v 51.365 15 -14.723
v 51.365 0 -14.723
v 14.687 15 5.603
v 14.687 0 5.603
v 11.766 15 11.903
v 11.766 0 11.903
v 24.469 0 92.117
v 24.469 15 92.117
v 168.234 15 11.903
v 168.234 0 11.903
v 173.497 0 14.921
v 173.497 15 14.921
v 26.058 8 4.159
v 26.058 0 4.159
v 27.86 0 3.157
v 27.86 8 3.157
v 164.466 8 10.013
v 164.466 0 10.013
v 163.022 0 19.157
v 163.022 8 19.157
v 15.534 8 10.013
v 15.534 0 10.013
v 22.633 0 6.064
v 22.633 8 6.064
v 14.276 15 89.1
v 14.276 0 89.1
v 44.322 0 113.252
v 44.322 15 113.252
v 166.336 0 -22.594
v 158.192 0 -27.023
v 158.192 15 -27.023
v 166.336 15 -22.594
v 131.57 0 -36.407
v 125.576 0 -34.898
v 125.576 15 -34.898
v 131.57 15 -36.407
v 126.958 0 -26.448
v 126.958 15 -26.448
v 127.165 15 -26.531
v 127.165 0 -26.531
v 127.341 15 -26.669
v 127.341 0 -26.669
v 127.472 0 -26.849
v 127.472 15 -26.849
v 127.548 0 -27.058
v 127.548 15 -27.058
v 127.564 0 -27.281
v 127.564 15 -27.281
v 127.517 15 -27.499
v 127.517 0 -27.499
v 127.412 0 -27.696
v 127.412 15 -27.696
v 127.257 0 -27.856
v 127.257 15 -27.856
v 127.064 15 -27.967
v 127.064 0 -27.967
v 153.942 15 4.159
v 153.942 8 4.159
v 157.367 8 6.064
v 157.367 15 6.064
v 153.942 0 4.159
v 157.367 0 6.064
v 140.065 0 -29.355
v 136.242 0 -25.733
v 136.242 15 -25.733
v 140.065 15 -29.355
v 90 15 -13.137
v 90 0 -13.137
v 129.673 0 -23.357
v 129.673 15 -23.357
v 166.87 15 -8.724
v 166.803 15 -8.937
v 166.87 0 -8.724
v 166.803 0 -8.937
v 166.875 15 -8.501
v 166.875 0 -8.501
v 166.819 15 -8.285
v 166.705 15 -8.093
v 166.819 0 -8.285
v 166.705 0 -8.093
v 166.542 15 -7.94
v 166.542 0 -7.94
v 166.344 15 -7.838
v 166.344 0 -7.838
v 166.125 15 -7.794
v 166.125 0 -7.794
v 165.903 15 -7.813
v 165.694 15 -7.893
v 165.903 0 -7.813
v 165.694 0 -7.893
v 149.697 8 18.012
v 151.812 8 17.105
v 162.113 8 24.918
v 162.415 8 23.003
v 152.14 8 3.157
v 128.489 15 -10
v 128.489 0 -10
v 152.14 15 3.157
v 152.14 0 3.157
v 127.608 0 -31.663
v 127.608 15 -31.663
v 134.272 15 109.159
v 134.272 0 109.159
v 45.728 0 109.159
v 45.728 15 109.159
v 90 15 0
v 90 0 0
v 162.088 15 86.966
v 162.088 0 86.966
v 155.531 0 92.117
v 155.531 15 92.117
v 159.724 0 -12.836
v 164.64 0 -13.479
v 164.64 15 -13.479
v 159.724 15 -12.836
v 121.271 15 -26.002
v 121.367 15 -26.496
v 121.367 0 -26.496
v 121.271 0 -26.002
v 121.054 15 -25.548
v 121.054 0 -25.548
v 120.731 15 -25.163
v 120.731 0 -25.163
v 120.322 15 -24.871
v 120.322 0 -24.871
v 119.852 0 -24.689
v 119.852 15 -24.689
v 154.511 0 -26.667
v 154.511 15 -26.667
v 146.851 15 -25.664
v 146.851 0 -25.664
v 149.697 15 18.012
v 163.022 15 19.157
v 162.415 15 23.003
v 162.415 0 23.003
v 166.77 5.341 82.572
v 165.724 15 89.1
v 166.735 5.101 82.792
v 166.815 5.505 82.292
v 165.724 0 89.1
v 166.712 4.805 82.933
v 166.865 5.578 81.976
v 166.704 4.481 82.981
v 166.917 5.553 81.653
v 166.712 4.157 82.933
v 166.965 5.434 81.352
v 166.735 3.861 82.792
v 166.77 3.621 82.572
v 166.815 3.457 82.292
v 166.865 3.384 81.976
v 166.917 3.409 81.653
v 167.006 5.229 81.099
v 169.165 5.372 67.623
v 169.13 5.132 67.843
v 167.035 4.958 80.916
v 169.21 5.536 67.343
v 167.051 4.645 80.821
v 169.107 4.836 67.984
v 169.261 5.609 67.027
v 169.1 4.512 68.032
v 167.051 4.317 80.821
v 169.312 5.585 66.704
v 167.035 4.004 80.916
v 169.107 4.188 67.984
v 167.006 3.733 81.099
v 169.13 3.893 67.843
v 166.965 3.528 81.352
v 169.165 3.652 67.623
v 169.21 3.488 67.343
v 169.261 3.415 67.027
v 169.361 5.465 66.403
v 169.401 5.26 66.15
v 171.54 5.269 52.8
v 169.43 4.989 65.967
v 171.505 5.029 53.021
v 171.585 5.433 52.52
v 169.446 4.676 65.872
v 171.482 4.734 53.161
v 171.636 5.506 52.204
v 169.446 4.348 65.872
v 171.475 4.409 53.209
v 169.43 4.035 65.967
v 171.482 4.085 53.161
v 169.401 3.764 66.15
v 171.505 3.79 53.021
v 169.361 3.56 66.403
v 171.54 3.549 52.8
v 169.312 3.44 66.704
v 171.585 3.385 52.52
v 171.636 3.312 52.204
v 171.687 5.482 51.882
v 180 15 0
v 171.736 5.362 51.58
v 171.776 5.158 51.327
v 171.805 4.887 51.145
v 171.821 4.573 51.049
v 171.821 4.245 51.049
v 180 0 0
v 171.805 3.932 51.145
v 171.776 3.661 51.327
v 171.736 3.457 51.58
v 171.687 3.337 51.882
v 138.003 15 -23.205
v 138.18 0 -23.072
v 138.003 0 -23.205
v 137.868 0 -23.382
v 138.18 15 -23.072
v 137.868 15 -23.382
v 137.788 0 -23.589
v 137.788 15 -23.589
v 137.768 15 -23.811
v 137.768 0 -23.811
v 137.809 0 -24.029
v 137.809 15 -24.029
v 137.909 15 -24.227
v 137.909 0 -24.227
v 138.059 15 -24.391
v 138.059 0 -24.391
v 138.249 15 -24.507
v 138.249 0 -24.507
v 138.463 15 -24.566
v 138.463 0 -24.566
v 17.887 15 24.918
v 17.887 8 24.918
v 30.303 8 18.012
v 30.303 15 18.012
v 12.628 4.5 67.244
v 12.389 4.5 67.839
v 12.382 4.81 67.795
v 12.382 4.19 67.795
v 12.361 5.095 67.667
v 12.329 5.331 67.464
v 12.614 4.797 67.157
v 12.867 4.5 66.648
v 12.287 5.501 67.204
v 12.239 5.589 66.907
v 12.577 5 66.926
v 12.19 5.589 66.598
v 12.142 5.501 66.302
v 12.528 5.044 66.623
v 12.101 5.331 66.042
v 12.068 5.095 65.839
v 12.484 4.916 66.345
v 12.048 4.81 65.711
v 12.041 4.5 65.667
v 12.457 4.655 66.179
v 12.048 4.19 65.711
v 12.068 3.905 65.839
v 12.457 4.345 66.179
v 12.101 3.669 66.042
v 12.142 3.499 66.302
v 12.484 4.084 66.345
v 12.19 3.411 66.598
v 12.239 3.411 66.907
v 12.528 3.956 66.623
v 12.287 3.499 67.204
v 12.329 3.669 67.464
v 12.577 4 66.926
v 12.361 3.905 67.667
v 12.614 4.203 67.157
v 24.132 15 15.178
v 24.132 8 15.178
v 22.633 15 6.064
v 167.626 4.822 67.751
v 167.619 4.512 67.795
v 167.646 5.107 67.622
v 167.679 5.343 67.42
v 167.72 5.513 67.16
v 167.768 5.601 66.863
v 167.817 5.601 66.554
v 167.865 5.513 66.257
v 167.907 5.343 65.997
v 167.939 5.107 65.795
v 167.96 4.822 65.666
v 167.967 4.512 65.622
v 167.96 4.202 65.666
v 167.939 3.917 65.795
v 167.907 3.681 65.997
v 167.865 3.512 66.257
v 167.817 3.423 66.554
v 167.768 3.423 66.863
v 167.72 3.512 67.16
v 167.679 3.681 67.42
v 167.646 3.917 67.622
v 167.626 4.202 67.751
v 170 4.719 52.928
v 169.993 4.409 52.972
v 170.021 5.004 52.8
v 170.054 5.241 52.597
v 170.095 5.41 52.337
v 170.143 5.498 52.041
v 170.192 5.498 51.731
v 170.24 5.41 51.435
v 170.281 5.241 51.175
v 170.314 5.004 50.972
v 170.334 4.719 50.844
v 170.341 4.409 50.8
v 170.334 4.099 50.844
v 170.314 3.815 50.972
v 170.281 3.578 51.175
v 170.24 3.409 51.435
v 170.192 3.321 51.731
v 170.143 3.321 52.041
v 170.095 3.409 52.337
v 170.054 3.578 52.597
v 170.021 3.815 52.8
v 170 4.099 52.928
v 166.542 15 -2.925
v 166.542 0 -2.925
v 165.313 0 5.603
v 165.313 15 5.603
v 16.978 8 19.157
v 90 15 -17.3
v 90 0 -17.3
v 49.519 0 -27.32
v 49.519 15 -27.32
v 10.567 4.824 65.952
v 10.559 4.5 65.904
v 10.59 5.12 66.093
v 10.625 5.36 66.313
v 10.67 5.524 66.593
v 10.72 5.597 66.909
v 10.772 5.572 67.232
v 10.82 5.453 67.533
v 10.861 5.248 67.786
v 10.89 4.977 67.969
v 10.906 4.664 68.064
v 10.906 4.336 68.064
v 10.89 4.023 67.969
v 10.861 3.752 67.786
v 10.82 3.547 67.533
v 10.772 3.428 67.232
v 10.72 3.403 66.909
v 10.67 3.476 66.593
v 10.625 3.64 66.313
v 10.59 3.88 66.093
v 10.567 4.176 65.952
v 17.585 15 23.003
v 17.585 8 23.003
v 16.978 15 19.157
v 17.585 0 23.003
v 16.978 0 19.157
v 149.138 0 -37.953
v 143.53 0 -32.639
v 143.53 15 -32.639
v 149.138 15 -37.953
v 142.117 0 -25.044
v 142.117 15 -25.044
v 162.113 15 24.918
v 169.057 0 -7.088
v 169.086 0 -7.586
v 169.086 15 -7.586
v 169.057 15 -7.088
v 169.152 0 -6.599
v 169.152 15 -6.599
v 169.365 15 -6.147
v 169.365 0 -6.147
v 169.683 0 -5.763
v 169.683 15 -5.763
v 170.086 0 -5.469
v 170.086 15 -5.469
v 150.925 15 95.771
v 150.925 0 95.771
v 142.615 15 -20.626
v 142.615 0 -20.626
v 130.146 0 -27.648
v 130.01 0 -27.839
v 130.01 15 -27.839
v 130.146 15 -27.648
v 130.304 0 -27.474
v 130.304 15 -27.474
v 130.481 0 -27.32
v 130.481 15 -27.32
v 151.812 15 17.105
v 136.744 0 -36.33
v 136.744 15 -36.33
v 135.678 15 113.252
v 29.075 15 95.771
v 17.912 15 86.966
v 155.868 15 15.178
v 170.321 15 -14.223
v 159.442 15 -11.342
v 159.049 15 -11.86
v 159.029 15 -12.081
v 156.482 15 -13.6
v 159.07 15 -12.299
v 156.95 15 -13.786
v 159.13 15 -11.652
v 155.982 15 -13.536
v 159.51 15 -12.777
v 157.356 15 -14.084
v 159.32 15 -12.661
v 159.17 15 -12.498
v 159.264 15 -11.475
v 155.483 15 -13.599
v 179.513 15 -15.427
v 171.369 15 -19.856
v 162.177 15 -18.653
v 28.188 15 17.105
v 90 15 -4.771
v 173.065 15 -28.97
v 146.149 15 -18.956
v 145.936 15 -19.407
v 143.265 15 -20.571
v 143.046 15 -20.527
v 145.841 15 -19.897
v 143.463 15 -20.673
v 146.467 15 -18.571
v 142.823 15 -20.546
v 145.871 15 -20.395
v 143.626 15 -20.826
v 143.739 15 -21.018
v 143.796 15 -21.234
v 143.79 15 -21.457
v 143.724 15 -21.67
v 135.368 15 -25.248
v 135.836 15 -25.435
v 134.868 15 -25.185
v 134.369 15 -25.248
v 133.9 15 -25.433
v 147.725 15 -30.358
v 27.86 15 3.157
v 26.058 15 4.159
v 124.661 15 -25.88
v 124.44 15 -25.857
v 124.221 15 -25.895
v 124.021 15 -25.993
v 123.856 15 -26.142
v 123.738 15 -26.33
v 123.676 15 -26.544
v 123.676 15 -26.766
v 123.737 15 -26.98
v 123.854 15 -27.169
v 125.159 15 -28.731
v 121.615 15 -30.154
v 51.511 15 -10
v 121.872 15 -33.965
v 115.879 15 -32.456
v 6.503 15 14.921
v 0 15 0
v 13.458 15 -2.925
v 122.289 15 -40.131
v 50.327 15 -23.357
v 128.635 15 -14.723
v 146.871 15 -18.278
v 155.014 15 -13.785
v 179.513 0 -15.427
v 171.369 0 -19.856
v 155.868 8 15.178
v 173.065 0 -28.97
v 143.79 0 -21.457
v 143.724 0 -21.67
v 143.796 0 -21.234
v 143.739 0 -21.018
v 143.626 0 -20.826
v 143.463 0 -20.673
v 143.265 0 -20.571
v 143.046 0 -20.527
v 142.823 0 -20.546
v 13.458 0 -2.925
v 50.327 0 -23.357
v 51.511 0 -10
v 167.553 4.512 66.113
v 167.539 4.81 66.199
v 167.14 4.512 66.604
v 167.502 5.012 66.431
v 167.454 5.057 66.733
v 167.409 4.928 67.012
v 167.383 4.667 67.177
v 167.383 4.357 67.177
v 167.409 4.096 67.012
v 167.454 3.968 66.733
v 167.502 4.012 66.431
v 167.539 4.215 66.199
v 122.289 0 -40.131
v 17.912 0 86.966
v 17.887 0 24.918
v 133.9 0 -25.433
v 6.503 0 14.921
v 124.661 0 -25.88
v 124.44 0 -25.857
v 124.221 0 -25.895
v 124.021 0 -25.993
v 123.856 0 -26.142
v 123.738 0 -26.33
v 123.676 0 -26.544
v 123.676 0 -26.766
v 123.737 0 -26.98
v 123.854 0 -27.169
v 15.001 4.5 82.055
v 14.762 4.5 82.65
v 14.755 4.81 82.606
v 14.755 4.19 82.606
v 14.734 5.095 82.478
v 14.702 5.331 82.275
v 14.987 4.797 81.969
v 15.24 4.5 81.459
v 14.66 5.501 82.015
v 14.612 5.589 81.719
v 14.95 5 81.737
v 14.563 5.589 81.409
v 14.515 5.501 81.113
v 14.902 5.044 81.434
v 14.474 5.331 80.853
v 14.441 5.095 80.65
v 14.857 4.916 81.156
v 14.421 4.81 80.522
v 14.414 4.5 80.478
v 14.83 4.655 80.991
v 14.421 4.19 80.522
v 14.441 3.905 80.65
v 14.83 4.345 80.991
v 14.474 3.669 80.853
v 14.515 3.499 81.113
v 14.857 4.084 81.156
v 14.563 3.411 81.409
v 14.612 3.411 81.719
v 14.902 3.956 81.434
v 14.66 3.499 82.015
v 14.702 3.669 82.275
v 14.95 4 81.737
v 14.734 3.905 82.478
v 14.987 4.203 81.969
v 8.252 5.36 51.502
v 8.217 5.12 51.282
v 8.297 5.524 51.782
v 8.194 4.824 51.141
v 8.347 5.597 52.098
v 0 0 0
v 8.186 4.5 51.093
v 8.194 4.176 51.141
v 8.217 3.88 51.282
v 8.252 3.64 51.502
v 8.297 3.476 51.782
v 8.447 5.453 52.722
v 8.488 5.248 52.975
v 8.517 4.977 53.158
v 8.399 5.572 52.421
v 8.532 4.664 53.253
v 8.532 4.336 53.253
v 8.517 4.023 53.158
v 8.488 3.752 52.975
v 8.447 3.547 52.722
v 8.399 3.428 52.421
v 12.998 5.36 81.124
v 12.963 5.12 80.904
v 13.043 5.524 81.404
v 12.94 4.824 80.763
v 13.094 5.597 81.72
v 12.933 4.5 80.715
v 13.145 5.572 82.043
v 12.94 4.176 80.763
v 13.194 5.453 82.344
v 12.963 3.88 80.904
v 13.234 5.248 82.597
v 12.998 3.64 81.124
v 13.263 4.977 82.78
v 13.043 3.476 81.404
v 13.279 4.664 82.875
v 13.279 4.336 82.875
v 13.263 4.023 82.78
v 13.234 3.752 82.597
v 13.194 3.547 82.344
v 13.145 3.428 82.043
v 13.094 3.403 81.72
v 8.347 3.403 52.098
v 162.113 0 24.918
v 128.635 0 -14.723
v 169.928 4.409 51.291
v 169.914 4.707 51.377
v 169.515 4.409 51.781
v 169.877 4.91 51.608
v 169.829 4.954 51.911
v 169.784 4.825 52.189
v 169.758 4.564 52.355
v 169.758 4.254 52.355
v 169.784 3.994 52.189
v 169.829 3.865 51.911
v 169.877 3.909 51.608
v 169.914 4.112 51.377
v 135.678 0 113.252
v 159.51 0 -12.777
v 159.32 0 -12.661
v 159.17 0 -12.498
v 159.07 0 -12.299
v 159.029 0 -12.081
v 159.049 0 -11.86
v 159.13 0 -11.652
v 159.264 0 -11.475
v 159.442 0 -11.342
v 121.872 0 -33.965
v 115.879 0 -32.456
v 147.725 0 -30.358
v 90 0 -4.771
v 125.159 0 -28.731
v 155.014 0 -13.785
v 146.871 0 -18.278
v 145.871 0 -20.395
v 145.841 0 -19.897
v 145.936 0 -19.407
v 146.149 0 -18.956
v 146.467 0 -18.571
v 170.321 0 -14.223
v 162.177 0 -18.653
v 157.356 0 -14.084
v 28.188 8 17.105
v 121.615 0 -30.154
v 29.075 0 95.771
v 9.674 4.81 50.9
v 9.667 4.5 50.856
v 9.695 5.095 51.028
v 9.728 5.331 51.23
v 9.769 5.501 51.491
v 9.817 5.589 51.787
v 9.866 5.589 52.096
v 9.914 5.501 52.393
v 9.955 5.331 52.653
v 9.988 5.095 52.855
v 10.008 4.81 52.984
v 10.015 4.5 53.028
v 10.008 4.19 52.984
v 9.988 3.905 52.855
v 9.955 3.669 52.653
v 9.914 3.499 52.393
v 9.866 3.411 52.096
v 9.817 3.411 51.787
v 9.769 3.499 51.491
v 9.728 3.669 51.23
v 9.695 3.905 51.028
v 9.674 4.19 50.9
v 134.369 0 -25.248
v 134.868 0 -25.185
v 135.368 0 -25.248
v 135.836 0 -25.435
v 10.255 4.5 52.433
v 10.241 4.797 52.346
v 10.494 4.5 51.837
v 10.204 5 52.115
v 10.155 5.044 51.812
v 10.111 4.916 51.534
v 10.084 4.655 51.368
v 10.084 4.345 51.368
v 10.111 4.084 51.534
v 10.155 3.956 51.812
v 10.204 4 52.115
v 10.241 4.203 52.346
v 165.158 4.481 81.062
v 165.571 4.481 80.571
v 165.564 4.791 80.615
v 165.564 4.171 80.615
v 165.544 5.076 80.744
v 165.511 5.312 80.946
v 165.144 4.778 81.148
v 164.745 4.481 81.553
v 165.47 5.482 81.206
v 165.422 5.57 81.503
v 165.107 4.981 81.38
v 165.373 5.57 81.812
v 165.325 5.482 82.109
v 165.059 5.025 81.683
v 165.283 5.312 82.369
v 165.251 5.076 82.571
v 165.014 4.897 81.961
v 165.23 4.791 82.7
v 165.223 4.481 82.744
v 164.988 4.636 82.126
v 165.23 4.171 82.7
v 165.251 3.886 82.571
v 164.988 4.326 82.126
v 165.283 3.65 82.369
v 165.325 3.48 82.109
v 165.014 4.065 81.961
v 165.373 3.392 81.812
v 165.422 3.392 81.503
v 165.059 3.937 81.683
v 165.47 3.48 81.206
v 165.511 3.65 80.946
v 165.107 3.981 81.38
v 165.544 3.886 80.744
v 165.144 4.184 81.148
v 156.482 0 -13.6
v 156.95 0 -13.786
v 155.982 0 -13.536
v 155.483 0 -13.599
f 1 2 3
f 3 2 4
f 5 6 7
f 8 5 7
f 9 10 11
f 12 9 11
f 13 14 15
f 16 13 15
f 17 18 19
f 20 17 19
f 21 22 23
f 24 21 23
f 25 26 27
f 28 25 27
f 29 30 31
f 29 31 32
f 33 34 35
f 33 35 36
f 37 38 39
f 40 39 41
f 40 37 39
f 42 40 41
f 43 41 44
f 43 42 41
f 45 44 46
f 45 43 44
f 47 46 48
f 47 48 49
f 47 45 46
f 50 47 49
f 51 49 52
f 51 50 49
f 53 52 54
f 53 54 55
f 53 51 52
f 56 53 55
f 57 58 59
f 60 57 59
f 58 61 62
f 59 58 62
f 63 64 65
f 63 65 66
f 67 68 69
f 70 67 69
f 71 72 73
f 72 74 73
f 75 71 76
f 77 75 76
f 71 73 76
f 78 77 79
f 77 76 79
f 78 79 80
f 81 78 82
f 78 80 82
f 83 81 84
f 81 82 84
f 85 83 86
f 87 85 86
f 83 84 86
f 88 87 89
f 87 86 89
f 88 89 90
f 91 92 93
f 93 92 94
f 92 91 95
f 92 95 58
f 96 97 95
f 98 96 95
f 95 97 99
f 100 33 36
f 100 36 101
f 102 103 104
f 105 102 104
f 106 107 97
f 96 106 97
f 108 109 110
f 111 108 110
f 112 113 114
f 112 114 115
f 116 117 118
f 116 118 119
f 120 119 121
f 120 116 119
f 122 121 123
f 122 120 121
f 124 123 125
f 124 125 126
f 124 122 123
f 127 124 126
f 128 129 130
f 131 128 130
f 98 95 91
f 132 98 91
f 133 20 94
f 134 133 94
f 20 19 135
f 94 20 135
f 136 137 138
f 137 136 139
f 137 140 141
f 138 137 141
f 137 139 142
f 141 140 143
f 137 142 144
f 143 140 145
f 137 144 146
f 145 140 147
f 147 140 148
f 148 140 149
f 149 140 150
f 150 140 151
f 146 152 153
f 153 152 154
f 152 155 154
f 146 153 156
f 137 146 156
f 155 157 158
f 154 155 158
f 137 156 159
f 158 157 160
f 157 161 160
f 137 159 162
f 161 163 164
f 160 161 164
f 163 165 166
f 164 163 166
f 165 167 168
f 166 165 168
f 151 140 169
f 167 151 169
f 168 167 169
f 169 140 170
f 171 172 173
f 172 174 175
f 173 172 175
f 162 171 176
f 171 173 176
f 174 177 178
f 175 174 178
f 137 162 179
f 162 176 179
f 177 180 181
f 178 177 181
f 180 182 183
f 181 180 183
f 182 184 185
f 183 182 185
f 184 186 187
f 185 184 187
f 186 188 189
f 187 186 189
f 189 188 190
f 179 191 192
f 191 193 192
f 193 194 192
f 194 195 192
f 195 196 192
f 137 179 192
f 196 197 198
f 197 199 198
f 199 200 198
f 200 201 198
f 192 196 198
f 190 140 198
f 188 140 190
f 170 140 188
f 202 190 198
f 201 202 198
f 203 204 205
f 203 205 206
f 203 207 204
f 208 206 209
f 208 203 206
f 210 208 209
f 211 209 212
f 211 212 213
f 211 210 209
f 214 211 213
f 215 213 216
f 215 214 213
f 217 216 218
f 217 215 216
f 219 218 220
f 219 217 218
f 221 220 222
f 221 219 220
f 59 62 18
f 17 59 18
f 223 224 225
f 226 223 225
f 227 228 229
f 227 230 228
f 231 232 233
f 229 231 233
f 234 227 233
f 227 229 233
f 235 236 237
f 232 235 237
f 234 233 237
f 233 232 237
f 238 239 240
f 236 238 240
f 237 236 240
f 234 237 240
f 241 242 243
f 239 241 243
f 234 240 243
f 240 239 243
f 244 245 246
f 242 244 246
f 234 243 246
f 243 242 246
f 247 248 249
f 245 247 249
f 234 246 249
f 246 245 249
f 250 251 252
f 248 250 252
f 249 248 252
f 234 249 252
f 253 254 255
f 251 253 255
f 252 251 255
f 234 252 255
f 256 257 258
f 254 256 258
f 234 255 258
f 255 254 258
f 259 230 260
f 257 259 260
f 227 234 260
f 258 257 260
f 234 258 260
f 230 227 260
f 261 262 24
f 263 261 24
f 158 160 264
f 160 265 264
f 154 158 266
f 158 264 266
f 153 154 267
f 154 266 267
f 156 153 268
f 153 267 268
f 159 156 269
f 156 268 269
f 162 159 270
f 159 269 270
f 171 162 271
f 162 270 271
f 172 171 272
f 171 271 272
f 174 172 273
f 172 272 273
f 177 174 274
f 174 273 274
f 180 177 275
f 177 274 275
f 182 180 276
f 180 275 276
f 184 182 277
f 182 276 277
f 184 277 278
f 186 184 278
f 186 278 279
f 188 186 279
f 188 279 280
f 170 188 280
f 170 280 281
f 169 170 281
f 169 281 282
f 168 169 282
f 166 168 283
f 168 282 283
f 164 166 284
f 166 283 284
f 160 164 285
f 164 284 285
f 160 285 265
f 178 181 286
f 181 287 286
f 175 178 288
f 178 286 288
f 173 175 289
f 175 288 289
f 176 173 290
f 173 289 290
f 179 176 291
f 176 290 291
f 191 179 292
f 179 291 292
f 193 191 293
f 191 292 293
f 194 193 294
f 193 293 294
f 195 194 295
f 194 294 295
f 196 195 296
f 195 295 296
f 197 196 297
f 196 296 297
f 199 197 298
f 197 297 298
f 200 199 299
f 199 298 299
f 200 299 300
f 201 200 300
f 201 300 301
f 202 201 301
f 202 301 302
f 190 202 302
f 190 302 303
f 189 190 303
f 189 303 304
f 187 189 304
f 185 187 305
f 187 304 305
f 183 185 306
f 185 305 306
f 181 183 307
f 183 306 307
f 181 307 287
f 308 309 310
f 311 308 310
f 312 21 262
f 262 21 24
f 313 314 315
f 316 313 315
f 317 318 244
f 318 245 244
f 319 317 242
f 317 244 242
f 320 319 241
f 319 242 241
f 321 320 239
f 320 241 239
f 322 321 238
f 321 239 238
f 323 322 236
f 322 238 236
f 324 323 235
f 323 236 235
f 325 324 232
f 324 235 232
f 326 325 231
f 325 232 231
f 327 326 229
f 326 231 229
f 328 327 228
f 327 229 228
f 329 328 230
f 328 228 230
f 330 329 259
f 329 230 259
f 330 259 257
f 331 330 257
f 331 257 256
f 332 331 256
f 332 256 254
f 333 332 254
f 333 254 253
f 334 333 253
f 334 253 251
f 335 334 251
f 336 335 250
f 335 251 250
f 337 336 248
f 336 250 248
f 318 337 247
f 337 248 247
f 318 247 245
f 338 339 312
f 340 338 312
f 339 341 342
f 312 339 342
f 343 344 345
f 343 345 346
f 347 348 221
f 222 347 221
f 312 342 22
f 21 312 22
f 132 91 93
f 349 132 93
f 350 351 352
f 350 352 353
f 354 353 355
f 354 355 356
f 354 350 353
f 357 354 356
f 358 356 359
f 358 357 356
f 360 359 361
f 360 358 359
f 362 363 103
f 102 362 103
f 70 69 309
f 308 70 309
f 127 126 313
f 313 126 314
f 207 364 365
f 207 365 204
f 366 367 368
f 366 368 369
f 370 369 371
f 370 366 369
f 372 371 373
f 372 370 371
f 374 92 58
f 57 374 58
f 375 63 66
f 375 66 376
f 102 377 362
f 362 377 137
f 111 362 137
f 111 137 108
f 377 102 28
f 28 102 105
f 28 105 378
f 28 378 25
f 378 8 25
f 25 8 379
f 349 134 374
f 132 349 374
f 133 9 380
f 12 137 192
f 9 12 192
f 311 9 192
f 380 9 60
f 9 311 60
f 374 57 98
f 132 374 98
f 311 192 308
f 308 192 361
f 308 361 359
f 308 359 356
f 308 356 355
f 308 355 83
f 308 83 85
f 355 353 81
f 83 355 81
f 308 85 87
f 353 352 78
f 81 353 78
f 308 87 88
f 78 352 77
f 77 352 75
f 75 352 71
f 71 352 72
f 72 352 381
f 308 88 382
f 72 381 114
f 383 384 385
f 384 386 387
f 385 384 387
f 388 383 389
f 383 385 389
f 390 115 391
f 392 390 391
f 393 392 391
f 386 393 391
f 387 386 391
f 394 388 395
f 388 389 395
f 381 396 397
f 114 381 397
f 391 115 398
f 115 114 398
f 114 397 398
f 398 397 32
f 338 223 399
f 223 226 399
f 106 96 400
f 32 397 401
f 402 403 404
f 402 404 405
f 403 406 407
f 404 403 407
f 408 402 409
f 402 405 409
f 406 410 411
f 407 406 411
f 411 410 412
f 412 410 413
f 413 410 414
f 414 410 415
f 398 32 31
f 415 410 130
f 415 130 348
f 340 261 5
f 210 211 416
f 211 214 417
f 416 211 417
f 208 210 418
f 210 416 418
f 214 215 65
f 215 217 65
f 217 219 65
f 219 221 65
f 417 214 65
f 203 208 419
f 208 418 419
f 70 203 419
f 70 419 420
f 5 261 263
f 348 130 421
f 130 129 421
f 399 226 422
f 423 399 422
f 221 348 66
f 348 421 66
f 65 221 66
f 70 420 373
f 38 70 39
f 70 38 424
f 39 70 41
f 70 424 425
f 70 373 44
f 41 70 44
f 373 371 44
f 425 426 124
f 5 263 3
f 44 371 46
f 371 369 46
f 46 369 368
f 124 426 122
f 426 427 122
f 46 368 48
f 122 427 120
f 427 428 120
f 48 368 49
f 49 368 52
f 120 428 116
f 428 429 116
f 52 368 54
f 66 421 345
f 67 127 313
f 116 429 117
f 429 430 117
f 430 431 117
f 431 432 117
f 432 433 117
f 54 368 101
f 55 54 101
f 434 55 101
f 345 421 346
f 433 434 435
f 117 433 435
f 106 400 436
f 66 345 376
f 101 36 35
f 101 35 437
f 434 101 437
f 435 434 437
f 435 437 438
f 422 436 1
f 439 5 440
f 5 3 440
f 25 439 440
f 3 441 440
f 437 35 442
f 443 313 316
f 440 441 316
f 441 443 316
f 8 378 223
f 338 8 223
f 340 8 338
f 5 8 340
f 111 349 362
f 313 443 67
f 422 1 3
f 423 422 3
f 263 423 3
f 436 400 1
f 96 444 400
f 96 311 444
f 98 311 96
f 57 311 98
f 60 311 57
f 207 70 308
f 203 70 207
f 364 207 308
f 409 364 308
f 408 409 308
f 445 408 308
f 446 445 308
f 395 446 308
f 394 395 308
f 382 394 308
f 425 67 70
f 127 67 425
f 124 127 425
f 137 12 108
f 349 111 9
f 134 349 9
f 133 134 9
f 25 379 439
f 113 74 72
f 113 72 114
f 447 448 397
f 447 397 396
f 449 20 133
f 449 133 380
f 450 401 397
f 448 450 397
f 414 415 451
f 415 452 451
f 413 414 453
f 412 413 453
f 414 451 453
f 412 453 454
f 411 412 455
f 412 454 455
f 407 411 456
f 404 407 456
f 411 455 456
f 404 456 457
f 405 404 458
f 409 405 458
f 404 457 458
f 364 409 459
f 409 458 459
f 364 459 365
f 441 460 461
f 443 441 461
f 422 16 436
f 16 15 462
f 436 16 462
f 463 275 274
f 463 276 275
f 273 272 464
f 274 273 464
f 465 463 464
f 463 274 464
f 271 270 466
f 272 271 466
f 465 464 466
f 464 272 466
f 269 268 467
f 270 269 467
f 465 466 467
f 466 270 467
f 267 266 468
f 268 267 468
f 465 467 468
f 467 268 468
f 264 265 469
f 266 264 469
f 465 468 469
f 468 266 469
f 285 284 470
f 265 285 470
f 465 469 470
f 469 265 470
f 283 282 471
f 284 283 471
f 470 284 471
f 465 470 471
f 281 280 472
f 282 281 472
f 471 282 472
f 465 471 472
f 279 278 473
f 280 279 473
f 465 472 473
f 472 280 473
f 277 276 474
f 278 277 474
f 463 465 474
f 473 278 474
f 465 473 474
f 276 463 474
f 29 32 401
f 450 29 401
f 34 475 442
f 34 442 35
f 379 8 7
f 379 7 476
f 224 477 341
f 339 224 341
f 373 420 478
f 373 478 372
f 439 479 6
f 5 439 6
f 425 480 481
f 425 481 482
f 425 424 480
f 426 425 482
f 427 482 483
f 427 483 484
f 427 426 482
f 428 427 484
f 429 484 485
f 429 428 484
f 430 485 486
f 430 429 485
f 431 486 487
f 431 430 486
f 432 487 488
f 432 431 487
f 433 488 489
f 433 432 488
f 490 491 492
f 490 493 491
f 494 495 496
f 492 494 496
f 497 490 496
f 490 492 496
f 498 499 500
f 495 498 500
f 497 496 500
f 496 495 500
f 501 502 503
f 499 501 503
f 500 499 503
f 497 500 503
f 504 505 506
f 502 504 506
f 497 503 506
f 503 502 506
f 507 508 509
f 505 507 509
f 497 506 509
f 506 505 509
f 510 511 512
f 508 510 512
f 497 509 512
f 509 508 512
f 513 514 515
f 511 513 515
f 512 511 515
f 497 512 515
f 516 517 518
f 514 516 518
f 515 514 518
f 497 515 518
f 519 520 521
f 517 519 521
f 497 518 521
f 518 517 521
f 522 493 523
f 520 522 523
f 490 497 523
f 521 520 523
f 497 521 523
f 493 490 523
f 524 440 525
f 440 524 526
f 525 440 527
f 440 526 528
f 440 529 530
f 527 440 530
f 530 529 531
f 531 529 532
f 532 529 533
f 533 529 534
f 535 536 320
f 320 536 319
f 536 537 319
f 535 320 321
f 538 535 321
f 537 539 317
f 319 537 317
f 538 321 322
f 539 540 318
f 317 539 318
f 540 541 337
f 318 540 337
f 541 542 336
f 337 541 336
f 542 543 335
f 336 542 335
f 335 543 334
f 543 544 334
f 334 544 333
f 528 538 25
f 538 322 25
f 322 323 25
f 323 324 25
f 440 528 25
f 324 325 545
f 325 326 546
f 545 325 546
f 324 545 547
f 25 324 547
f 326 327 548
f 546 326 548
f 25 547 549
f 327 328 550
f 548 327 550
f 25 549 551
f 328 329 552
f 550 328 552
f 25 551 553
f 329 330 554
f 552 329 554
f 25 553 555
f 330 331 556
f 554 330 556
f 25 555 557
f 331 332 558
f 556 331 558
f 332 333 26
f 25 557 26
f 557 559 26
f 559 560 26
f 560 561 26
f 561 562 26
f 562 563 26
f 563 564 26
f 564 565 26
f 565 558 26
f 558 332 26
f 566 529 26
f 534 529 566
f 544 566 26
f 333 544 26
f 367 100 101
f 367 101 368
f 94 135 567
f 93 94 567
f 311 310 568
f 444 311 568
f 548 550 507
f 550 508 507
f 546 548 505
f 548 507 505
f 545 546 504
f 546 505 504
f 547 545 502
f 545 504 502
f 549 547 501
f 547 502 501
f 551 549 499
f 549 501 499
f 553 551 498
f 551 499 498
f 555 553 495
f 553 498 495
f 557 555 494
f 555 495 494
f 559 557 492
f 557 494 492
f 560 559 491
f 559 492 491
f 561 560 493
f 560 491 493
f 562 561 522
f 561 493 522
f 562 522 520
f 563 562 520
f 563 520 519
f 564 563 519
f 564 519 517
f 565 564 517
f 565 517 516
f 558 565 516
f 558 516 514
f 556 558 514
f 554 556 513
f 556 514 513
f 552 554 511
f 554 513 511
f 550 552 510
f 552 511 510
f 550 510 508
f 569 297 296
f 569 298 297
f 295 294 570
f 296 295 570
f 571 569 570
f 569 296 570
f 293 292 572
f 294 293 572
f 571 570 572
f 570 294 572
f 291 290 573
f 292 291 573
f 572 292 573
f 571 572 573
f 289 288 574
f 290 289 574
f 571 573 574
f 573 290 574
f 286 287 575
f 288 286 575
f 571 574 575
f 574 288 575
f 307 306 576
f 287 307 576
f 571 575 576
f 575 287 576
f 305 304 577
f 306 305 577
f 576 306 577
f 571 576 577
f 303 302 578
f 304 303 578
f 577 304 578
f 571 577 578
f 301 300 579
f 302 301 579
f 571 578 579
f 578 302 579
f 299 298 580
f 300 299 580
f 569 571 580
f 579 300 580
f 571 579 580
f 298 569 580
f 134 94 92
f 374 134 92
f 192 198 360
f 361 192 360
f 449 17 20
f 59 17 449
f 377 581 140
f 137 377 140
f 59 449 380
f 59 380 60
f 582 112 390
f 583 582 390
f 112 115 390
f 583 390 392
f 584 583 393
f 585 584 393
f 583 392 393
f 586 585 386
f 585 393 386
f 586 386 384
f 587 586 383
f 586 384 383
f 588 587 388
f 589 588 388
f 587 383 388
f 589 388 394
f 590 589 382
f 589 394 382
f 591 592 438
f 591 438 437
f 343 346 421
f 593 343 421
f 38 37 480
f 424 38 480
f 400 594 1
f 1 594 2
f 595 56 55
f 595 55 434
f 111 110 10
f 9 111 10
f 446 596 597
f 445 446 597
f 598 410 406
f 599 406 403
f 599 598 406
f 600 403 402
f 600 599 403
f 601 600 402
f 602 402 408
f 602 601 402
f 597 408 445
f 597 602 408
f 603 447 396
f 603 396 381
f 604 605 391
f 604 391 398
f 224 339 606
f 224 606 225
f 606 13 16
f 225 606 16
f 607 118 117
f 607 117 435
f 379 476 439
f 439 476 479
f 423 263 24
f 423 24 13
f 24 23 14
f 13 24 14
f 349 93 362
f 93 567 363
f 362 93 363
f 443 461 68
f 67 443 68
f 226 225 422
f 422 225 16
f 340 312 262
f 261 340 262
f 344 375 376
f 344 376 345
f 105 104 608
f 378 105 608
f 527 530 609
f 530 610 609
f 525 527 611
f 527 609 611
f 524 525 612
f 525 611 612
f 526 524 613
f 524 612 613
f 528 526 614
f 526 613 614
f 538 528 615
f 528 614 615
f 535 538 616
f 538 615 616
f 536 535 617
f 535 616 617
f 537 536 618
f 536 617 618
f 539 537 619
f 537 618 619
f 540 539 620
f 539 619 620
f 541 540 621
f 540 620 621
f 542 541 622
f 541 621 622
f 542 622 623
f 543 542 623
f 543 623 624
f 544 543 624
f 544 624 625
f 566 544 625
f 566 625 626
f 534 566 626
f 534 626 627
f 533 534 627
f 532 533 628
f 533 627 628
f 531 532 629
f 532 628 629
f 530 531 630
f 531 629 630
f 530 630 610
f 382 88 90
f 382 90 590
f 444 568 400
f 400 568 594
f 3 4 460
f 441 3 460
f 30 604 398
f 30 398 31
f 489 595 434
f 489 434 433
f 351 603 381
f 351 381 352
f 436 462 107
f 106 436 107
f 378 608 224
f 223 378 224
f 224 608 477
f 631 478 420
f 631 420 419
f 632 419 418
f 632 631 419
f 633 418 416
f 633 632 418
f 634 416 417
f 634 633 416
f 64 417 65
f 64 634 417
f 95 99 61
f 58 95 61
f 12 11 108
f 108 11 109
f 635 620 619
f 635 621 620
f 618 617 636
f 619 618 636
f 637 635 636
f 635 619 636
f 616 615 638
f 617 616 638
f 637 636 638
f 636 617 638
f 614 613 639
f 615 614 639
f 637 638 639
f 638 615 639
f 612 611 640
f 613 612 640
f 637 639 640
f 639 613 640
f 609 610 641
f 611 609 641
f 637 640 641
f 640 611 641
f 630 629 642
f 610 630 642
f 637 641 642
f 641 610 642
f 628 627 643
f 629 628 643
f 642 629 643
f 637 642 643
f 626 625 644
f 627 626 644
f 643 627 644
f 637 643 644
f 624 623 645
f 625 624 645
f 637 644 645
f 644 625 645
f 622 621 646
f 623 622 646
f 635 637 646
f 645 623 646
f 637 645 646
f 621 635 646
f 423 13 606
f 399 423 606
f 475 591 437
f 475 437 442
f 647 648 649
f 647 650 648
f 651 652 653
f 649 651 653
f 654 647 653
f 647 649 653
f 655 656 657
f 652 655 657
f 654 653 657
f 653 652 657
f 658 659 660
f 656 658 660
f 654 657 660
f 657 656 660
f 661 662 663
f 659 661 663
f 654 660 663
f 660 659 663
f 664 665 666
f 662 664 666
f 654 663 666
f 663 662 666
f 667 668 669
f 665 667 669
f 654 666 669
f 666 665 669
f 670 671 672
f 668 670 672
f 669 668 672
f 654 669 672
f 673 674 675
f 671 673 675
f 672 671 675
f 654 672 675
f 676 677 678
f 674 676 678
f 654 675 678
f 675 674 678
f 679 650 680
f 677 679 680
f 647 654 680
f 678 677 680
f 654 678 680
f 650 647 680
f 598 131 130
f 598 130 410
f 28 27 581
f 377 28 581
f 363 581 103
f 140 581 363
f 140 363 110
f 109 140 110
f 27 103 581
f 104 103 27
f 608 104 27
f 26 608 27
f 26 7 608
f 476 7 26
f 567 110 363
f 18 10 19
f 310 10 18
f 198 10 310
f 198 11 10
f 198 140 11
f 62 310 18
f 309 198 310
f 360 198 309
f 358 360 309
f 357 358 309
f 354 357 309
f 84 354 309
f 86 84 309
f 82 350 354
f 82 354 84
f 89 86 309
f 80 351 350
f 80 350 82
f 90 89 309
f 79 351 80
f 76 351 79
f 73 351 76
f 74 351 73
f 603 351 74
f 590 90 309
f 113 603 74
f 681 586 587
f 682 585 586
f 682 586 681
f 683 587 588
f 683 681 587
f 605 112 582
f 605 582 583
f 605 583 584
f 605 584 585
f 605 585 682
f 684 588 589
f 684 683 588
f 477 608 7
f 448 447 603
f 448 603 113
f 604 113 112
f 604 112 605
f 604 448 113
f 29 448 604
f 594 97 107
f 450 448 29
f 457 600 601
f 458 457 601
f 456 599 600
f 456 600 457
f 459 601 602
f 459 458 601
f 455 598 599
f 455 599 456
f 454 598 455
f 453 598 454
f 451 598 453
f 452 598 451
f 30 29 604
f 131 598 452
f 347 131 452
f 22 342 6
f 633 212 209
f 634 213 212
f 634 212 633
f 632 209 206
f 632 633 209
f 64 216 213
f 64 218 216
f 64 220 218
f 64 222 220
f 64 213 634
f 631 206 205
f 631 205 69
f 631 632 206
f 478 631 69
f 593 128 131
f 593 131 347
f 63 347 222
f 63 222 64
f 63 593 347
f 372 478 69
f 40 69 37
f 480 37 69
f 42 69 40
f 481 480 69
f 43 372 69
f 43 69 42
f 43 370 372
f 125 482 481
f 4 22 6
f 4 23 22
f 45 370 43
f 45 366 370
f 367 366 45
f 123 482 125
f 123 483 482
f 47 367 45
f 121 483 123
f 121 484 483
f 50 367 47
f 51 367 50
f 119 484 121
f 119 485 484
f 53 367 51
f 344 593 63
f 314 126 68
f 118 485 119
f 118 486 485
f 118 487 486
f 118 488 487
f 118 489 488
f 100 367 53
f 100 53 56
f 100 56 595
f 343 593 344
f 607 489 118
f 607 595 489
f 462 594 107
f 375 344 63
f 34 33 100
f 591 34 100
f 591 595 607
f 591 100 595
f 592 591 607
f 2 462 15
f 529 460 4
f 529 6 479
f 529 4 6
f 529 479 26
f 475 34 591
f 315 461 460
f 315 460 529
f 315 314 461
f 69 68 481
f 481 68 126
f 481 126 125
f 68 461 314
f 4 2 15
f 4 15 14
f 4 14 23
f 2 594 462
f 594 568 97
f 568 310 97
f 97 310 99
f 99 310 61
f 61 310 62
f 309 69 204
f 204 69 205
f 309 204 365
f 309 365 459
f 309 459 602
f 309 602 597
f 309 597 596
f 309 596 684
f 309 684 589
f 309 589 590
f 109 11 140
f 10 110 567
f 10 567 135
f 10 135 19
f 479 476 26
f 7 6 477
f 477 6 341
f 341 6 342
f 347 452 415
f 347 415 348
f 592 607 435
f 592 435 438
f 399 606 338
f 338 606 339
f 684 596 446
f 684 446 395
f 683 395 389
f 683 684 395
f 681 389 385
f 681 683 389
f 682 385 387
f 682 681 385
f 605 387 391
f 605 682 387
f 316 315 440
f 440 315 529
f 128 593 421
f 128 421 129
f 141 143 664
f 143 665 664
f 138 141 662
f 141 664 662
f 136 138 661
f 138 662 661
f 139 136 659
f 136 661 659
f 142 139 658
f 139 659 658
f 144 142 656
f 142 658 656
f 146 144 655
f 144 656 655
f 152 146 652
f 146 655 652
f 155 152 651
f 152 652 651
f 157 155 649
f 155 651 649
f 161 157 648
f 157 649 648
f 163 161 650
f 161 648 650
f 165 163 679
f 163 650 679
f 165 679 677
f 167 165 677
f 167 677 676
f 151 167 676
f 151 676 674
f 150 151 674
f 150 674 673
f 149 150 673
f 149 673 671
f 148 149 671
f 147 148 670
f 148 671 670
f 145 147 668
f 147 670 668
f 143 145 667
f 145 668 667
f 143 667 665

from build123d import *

# Parameters (mm, degrees)
EXTRUDE_1_DEPTH = 15
EXTRUDE_START   = 8
EXTRUDE_3_DEPTH = 7
EXTRUDE_4_DEPTH = 15
EXTRUDE_5_DEPTH = 15
EXTRUDE_6_DEPTH = 15
FILLET_1_R      = 2
FILLET_2_R      = 0.8
F_2_0MM_1_D     = 2.2
F_2_0MM_1_DEPTH = 1.5
F_2_0MM_1_TIP   = 0.660946681
F_2_0MM_2_D     = 2.2
F_2_0MM_2_DEPTH = 1.5
F_2_0MM_2_TIP   = 0.660946681


with BuildPart() as part:
    # 草图1 → 凸台-拉伸1 (new body)
    with BuildSketch(Plane(origin=(0, 0, 0), x_dir=(1, 0, 0), z_dir=(0, 1, 0))):
        Polygon((49.5194763, 27.3201645), (0, 0), (14.2759212, -89.0995664), (44.3217232, -113.2519378), (135.6782768, -113.2519378), (165.7240788, -89.0995664), (180, 0), (130.4805237, 27.3201645), (90, 17.2995935), align=None)
        Polygon((6.502592683, -14.920940874), (11.7659704, -11.9027565), (24.4692995, -92.1170773), (17.9120995, -86.965507524), align=None, mode=Mode.SUBTRACT)
        Polygon((51.5112815, 10), (90, 0), (128.4887185, 10), (152.140164487, -3.156709279), (153.941562556, -4.158782079), (157.3669305, -6.0642288), (164.466088374, -10.013313195), (163.0222846, -19.1574054), (162.41503493, -23.003320662), (162.112651759, -24.918414423), (150.9253582, -95.7712863), (134.2722611, -109.1590702), (45.7277389, -109.1590702), (29.0746418, -95.7712863), (17.887348241, -24.918414423), (17.58496507, -23.003320662), (16.9777154, -19.1574054), (15.533911626, -10.013313195), (22.6330695, -6.0642288), (26.058437444, -4.158782079), (27.859835513, -3.156709279), align=None, mode=Mode.SUBTRACT)
        Polygon((162.0879005, -86.965507524), (155.5307005, -92.1170773), (168.2340296, -11.9027565), (173.497407317, -14.920940874), align=None, mode=Mode.SUBTRACT)
        Polygon((50.326908, 23.3565545), (90, 13.1373278), (129.673092, 23.3565545), (166.5422291, 2.924677806), (165.312614852, -5.602660324), (128.635248263, 14.72294235), (90, 4.7710495), (51.364751737, 14.72294235), (14.687385148, -5.602660324), (13.4577709, 2.924677806), align=None, mode=Mode.SUBTRACT)
    extrude(amount=EXTRUDE_1_DEPTH)

    # 草图1<4> → 凸台-拉伸3 (add)
    with BuildSketch(Plane(origin=(0, 0, 0), x_dir=(1, 0, 0), z_dir=(0, 1, 0)).offset(EXTRUDE_START)):
        Polygon((164.466088374, -10.013313195), (163.0222846, -19.1574054), (155.8678549, -15.177574667), (157.3669305, -6.0642288), align=None)
        Polygon((153.941562556, -4.158782079), (152.140164487, -3.156709279), (149.6966334, -18.0116932), (162.112651759, -24.918414423), (162.41503493, -23.003320662), (151.8119905, -17.1051116), align=None)
        Polygon((22.6330695, -6.0642288), (15.533911626, -10.013313195), (16.9777154, -19.1574054), (24.1321451, -15.177574667), align=None)
        Polygon((30.3033666, -18.0116932), (27.859835513, -3.156709279), (26.058437444, -4.158782079), (28.1880095, -17.1051116), (17.58496507, -23.003320662), (17.887348241, -24.918414423), align=None)
    extrude(amount=EXTRUDE_3_DEPTH)

    # 草图3 → 凸台-拉伸4 (add)
    with BuildSketch(Plane(origin=(0, 0, 0), x_dir=(1, 0, 0), z_dir=(0, 1, 0))):
        Polygon((115.878940082, 32.456095876), (121.872227157, 33.965105872), (122.289100924, 40.131370332), (125.576282273, 34.897725339), (131.569569347, 36.406735336), (127.607872073, 31.663154849), (130.895053422, 26.429509857), (125.159408505, 28.73146088), (121.197711231, 23.987880393), (121.614584999, 30.154144853), align=None)
    extrude(amount=EXTRUDE_4_DEPTH)

    # 草图4 → 凸台-拉伸5 (add)
    with BuildSketch(Plane(origin=(0, 0, 0), x_dir=(1, 0, 0), z_dir=(0, 1, 0))):
        Polygon((168.625201424, 5.109151957), (158.192316311, 27.022904619), (179.513278304, 15.426602313), (155.448122239, 12.276060926), (173.065400703, 28.970046279), align=None)
        Polygon((173.065400703, 28.970046279), (166.336199119, 22.593511282), (171.369395495, 19.85599565), align=None)
        Polygon((179.513278304, 15.426602313), (171.369395495, 19.85599565), (170.321206632, 14.223202586), align=None)
        Polygon((170.321206632, 14.223202586), (164.640193911, 13.479460653), (168.625201424, 5.109151957), align=None)
        Polygon((164.640193911, 13.479460653), (162.177323823, 18.652595923), (155.448122239, 12.276060926), align=None)
        Polygon((166.336199119, 22.593511282), (158.192316311, 27.022904619), (162.177323823, 18.652595923), align=None)
    extrude(amount=EXTRUDE_5_DEPTH)

    # 草图5 → 凸台-拉伸6 (add)
    with BuildSketch(Plane(origin=(0, 0, 0), x_dir=(1, 0, 0), z_dir=(0, 1, 0))):
        Polygon((145.437967888, 18.068925838), (136.74389696, 36.330386388), (154.511365288, 26.666801134), (134.457068567, 24.041349978), (149.138133954, 37.953004439), align=None)
        Polygon((143.530465967, 32.639225275), (136.74389696, 36.330386388), (140.064736554, 29.355129142), align=None)
        Polygon((149.138133954, 37.953004439), (143.530465967, 32.639225275), (147.724796281, 30.357962248), align=None)
        Polygon((154.511365288, 26.666801134), (147.724796281, 30.357962248), (146.851305561, 25.663968028), align=None)
        Polygon((146.851305561, 25.663968028), (142.117128294, 25.044183084), (145.437967888, 18.068925838), align=None)
        Polygon((142.117128294, 25.044183084), (140.064736554, 29.355129142), (134.457068567, 24.041349978), align=None)
    extrude(amount=EXTRUDE_6_DEPTH)

    # 圆角1
    # the kernel refuses this fillet: 2 mm, written as the material it adds along each edge
    with BuildSketch(Plane(origin=(121.268833448, 15, -25.039897652), x_dir=(-0.9707016379334082, 0, 0.2402880149183444), z_dir=(0, -1, 0))) as fillet_1_piece_1:
        with BuildLine():
            CenterArc((FILLET_1_R * 0.72959801192, FILLET_1_R), FILLET_1_R, 197.771167986, 72.228832014)
            Line((-FILLET_1_R * 0.222685090293, FILLET_1_R * 0.69478385816), (-FILLET_1_R * 0.241730752337, FILLET_1_R * 0.688679535323))
            Line((-FILLET_1_R * 0.241730752337, FILLET_1_R * 0.688679535323), (-FILLET_1_R * 0.0145919602384, -FILLET_1_R * 0.02))
            Line((-FILLET_1_R * 0.0145919602384, -FILLET_1_R * 0.02), (FILLET_1_R * 0.72959801192, -FILLET_1_R * 0.02))
            Line((FILLET_1_R * 0.72959801192, -FILLET_1_R * 0.02), (FILLET_1_R * 0.72959801192, 0))
        make_face()
    extrude(amount=15)
    with BuildSketch(Plane(origin=(130.355139653, 0, -27.289126864), x_dir=(-0.5318771148973955, 0, -0.8468215482900885), z_dir=(0, 1, 0))) as fillet_1_piece_2:
        with BuildLine():
            CenterArc((0.649299153, -2), FILLET_1_R, 90, 20.172783533)
            Line((-0.040405567, -0.122686121), (-0.054199661, -0.085139844))
            ThreePointArc((-0.054199661, -0.085139844), (-0.058195374, -0.048830544), (-0.03799259, 0.012512517))
            Line((-0.03799259, 0.012512517), (0, 0.04))
            Line((0, 0.04), (0.649299153, 0.04))
            Line((0.649299153, 0.04), (0.649299153, 0))
        make_face()
    extrude(amount=15)
    with BuildSketch(Plane(origin=(168.822041947, 0, -6.166940275), x_dir=(0.18294627145075168, 0, -0.9831229128457274), z_dir=(0, 1, 0))) as fillet_1_piece_3:
        with BuildLine():
            CenterArc((FILLET_1_R * 0.721961366951, -FILLET_1_R), FILLET_1_R, 90, 71.655658553)
            Line((-FILLET_1_R * 0.227220826301, -FILLET_1_R * 0.685272873726), (-FILLET_1_R * 0.246204470166, -FILLET_1_R * 0.678978331201))
            Line((-FILLET_1_R * 0.246204470166, -FILLET_1_R * 0.678978331201), (-FILLET_1_R * 0.014439227339, FILLET_1_R * 0.02))
            Line((-FILLET_1_R * 0.014439227339, FILLET_1_R * 0.02), (FILLET_1_R * 0.721961366951, FILLET_1_R * 0.02))
            Line((FILLET_1_R * 0.721961366951, FILLET_1_R * 0.02), (FILLET_1_R * 0.721961366951, 0))
        make_face()
    extrude(amount=15)
    with BuildSketch(Plane(origin=(156.29474807, 0, -13.078316465), x_dir=(-0.8755846083755204, 0, -0.4830647923166069), z_dir=(0, 1, 0)), Plane(origin=(135.180696403, 0, -24.727053647), x_dir=(-0.8755846083755225, 0, -0.4830647923166032), z_dir=(0, 1, 0))) as fillet_1_piece_4:
        with BuildLine():
            CenterArc((FILLET_1_R * 0.731143736262, -FILLET_1_R), FILLET_1_R, 90, 72.344341447)
            Line((-FILLET_1_R * 0.221752752158, -FILLET_1_R * 0.696704298814), (-FILLET_1_R * 0.240810681926, -FILLET_1_R * 0.69063838479))
            Line((-FILLET_1_R * 0.240810681926, -FILLET_1_R * 0.69063838479), (-FILLET_1_R * 0.0146228747252, FILLET_1_R * 0.02))
            Line((-FILLET_1_R * 0.0146228747252, FILLET_1_R * 0.02), (FILLET_1_R * 0.731143736262, FILLET_1_R * 0.02))
            Line((FILLET_1_R * 0.731143736262, FILLET_1_R * 0.02), (FILLET_1_R * 0.731143736262, 0))
        make_face()
    extrude(amount=15)
    with BuildSketch(Plane(origin=(145.606582968, 0, -18.975035304), x_dir=(0.8755846083755114, 0, 0.4830647923166232), z_dir=(0, 1, 0))) as fillet_1_piece_5:
        with BuildLine():
            CenterArc((FILLET_1_R * 0.721961366951, FILLET_1_R), FILLET_1_R, 198.344341447, 71.655658553)
            Line((-FILLET_1_R * 0.227220826301, FILLET_1_R * 0.685272873726), (-FILLET_1_R * 0.246204470166, FILLET_1_R * 0.678978331201))
            Line((-FILLET_1_R * 0.246204470166, FILLET_1_R * 0.678978331201), (-FILLET_1_R * 0.014439227339, -FILLET_1_R * 0.02))
            Line((-FILLET_1_R * 0.014439227339, -FILLET_1_R * 0.02), (FILLET_1_R * 0.721961366951, -FILLET_1_R * 0.02))
            Line((FILLET_1_R * 0.721961366951, -FILLET_1_R * 0.02), (FILLET_1_R * 0.721961366951, 0))
        make_face()
    extrude(amount=15)

    # 圆角2
    fillet_2_edges = [part.edges().sort_by_distance(p)[0] for p in [
        (122.286771787, 7.5, -25.291878665),
        (129.364316192, 7.5, -27.043857882),
        (167.872084093, 7.5, -6.691037191),
        (157.30763239, 7.5, -12.519502675),
        (144.792841891, 7.5, -19.423980684),
        (136.046428654, 7.5, -24.249424454),
    ]]
    fillet(fillet_2_edges, radius=FILLET_2_R)

    # Ø2.0mm 暗销孔1
    with Locations(Plane(origin=(0, 0, 0), x_dir=(0.1582065041586212, 0, 0.9874060471973565), z_dir=(-0.9874060471973565, 0, 0.1582065041586212))):
        with Locations((82.844584748, 4.5), (52.844584748, 4.5), (67.844584748, 4.5)):
            Hole(F_2_0MM_1_D / 2, depth=F_2_0MM_1_DEPTH)
            with Locations((0, 0, -(F_2_0MM_1_DEPTH + F_2_0MM_1_TIP / 2))):  # 118° drill point
                Cone(0, F_2_0MM_1_D / 2, F_2_0MM_1_TIP, mode=Mode.SUBTRACT)

    # Ø2.0mm 暗销孔2
    with Locations(Plane(origin=(175.494726368, 0, 28.118530604), x_dir=(0.15820650415862106, 0, -0.9874060471973566), z_dir=(0.9874060471973566, 0, 0.15820650415862106))):
        with Locations((-54.462210035, 4.481040738), (-39.322424853, 4.512160057), (-24.310921517, 4.409353726)):
            Hole(F_2_0MM_2_D / 2, depth=F_2_0MM_2_DEPTH)
            with Locations((0, 0, -(F_2_0MM_2_DEPTH + F_2_0MM_2_TIP / 2))):  # 118° drill point
                Cone(0, F_2_0MM_2_D / 2, F_2_0MM_2_TIP, mode=Mode.SUBTRACT)


solid = part.part
